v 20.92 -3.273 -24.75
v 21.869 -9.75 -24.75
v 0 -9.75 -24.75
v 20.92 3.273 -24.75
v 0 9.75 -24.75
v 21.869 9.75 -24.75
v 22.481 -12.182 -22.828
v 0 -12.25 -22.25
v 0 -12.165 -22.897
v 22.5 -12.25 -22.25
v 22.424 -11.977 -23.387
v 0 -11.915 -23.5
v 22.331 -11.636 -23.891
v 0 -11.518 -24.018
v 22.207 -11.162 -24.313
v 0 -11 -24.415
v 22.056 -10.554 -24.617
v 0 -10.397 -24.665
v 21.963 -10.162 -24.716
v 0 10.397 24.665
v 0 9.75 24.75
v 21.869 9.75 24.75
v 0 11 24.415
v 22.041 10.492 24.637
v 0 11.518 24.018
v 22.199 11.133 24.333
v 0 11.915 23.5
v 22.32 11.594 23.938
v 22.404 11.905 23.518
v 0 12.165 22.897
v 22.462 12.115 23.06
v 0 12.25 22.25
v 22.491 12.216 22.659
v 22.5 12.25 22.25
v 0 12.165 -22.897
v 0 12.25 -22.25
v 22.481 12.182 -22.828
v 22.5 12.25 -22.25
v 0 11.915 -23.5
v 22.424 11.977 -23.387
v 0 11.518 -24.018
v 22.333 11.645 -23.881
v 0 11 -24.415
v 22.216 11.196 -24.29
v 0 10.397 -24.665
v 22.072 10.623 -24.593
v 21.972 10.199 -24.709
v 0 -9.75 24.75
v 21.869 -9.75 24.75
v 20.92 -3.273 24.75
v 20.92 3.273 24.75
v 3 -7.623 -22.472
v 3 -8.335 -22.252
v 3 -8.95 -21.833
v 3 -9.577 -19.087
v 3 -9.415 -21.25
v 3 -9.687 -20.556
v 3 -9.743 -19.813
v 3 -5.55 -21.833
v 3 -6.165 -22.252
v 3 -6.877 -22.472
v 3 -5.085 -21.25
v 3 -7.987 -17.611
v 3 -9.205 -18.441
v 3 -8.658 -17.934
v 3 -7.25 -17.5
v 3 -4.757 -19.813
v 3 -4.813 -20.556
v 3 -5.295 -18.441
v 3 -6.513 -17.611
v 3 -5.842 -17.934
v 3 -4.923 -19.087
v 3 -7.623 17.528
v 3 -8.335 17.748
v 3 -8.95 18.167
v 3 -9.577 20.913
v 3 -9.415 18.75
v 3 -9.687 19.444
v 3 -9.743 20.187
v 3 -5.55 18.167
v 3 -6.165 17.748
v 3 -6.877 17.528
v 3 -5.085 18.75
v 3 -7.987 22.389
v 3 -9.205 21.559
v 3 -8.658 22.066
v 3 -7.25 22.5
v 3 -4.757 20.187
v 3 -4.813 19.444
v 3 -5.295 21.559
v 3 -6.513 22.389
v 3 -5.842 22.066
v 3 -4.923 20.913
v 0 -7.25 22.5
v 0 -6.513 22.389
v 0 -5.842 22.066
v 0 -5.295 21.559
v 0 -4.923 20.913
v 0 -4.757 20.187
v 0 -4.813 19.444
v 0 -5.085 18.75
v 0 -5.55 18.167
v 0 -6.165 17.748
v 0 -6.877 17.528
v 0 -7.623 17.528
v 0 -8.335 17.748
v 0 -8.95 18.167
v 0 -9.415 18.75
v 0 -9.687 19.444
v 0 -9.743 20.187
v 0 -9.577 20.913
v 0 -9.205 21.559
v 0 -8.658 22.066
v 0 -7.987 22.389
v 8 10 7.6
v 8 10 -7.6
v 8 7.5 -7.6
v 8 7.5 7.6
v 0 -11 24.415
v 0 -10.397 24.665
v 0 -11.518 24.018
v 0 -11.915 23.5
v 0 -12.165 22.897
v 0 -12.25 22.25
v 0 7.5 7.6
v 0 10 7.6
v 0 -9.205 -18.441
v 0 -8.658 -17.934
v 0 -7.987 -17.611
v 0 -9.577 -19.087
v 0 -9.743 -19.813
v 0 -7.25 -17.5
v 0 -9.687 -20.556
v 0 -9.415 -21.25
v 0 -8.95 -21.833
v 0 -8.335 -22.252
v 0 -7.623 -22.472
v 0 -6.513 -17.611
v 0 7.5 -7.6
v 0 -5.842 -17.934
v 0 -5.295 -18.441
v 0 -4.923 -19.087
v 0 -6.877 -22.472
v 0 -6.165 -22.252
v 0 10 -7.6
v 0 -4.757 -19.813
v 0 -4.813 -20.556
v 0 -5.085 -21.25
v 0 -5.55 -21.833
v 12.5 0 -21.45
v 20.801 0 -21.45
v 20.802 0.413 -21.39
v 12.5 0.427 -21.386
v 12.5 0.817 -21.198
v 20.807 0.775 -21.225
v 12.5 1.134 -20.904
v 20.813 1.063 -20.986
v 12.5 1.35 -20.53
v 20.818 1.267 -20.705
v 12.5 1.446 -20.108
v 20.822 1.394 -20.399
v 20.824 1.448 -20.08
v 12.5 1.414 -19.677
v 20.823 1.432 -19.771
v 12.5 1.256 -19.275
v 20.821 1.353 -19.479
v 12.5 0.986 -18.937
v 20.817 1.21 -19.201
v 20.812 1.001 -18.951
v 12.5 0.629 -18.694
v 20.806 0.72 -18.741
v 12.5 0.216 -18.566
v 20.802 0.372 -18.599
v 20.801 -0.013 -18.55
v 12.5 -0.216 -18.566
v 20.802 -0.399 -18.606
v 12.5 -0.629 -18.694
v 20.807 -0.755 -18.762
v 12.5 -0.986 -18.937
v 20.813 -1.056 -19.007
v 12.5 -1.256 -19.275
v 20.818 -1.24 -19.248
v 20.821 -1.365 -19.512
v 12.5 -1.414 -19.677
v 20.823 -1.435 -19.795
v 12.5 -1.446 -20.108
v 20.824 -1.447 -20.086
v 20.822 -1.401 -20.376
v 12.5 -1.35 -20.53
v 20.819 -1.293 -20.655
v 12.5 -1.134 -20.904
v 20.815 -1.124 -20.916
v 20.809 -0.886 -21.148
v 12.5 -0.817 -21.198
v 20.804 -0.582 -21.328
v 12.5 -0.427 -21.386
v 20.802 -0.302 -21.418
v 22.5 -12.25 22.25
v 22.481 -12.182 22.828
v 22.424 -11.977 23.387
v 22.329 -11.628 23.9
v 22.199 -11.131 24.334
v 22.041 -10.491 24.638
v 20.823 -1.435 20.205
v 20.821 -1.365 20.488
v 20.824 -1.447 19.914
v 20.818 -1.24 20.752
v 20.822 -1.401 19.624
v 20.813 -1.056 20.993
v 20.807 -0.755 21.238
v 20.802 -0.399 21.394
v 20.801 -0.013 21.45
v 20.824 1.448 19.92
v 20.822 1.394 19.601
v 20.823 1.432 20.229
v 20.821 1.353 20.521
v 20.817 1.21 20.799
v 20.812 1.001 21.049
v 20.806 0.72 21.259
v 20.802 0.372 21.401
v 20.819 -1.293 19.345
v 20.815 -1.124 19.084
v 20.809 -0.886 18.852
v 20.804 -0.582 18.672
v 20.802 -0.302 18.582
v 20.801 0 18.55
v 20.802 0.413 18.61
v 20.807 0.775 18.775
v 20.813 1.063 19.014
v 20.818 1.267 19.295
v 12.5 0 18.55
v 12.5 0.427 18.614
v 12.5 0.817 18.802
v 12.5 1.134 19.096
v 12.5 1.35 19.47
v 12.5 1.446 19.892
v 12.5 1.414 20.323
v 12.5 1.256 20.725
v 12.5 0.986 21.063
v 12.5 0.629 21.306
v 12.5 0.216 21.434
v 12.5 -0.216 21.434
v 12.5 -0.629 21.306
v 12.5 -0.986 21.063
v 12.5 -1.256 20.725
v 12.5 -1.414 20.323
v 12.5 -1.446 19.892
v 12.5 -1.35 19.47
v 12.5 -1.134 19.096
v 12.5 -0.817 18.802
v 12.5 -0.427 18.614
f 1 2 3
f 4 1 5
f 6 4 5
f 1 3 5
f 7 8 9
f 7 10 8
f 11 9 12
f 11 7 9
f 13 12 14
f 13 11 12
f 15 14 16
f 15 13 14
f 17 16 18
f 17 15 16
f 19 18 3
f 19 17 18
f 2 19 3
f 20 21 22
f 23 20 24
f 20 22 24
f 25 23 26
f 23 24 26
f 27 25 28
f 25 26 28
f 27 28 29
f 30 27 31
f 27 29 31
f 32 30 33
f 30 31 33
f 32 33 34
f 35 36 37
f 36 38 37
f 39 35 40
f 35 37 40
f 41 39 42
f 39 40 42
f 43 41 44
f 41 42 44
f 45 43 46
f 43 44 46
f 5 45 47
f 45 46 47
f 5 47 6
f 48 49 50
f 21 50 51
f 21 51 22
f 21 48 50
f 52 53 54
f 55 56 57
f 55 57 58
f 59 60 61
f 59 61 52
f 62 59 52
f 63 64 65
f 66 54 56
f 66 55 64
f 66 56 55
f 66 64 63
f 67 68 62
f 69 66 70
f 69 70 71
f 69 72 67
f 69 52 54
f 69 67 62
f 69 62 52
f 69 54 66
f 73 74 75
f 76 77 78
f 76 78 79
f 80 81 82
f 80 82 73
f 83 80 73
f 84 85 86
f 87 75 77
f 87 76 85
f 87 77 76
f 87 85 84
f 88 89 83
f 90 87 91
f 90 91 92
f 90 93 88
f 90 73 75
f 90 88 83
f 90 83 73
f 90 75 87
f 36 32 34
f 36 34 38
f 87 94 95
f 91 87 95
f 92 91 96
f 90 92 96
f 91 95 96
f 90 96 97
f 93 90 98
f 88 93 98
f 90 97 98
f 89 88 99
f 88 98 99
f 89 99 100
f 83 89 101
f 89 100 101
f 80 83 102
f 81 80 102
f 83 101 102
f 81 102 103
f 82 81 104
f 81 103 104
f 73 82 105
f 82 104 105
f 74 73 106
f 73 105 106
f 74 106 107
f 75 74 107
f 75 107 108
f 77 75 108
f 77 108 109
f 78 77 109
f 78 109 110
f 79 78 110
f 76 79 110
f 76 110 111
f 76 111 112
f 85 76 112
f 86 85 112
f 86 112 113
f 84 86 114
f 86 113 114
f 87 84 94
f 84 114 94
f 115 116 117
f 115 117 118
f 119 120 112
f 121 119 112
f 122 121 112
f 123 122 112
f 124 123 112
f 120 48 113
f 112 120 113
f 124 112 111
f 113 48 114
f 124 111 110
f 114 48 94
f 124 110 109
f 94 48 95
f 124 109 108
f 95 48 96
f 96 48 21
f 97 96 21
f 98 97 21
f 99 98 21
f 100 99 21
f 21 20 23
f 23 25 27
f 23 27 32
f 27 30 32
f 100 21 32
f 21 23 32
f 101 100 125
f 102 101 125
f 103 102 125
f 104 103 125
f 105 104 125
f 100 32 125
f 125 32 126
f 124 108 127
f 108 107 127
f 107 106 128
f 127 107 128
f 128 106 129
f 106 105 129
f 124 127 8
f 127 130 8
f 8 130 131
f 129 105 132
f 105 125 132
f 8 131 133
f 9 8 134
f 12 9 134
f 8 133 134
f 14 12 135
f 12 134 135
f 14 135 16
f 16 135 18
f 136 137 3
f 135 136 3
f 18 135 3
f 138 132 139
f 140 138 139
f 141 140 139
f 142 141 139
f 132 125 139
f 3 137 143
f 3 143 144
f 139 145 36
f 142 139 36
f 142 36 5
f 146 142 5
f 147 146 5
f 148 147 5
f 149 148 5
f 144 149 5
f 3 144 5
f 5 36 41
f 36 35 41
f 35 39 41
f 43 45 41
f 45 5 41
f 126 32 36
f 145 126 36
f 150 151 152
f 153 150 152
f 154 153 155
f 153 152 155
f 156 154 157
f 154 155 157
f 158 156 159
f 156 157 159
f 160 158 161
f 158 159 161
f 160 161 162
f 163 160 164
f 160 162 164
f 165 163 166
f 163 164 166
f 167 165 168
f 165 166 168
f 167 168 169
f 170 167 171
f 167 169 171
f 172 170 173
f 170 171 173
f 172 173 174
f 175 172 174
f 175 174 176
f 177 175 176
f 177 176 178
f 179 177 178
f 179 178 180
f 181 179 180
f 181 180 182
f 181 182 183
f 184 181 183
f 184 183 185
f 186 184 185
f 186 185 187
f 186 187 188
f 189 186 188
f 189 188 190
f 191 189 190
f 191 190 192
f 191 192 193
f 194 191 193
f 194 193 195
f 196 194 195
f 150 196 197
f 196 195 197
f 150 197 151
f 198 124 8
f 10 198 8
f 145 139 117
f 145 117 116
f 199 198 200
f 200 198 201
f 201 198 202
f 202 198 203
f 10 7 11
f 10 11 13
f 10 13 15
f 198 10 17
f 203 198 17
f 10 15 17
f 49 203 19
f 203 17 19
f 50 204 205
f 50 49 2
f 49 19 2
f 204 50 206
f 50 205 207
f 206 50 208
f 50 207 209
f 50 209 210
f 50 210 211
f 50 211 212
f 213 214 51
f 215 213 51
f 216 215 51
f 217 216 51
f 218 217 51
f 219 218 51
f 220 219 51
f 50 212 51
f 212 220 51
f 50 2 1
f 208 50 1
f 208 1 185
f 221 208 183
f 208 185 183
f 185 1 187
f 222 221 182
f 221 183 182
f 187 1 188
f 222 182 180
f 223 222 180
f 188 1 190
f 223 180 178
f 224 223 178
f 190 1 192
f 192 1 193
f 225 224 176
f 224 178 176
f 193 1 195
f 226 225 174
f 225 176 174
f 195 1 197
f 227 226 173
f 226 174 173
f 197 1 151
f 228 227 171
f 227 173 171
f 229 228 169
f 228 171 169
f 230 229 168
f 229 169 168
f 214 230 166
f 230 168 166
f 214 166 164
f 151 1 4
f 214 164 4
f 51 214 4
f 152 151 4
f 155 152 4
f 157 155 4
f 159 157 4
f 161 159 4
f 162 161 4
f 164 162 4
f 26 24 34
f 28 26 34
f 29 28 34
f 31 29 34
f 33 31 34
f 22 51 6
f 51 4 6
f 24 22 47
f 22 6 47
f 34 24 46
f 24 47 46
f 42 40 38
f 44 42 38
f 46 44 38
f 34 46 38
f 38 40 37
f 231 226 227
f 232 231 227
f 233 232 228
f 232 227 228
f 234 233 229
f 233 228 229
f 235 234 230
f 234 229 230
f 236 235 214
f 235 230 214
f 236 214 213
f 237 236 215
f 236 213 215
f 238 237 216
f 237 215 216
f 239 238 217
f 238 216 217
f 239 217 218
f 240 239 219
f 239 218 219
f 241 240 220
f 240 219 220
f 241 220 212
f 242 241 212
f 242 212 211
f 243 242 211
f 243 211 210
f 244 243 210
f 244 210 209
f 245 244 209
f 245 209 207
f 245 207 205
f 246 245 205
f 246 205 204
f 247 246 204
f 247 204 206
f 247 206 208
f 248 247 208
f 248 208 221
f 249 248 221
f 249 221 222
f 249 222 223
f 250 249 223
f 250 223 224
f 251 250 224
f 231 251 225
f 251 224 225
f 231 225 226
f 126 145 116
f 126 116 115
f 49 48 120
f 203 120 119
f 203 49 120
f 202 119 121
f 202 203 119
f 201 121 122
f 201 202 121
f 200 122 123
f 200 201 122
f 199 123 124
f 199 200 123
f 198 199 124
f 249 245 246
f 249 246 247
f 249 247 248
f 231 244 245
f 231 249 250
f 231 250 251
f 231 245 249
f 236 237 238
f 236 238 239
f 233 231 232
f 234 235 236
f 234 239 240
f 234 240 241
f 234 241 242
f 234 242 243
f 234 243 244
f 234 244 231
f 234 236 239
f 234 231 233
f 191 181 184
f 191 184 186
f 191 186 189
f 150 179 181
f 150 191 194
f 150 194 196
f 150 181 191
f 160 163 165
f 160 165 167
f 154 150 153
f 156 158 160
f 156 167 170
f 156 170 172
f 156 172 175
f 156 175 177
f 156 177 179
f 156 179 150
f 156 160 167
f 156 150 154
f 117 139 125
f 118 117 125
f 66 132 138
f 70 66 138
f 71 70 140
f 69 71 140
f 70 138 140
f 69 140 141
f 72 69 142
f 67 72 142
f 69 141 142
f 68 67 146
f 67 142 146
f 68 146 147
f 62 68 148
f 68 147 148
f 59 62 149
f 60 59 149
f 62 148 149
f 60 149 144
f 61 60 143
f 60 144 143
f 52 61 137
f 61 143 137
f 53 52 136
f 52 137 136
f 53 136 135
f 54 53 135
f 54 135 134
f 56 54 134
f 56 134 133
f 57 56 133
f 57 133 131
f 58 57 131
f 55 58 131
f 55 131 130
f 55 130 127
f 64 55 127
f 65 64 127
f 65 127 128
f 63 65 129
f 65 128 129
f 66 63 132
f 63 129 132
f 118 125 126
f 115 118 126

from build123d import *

# Parameters (mm, degrees)
SKETCH_1_W          = 49.5
SKETCH_1_H          = 24.5
EXTRUDE_1_DEPTH     = 22.5
SKETCH_2_R          = 2.5
CUT_EXTRUDE_1_DEPTH = 3
SKETCH_3_W          = 15.2
SKETCH_3_H          = 2.5
CUT_EXTRUDE_2_DEPTH = 8
CUT_EXTRUDE_3_DEPTH = 50
CUT_EXTRUDE_START   = 22.5
SKETCH_5_R          = 1.45
CUT_EXTRUDE_4_DEPTH = 10
FILLET_1_R          = 2.5


with BuildPart() as part:
    # Эскиз1 → Бобышка-Вытянуть1 (new body)
    with BuildSketch(Plane(origin=(0, 0, 0), x_dir=(0, 0, -1), z_dir=(1, 0, 0))):
        Rectangle(SKETCH_1_W, SKETCH_1_H)
    extrude(amount=EXTRUDE_1_DEPTH)

    # Эскиз2 → Вырез-Вытянуть1 (cut)
    with BuildSketch(Plane.ZY):
        with Locations((-20, -7.25)):
            Circle(SKETCH_2_R)
        with Locations((20, -7.25)):
            Circle(SKETCH_2_R)
    extrude(amount=-CUT_EXTRUDE_1_DEPTH, mode=Mode.SUBTRACT)

    # Эскиз3 → Вырез-Вытянуть2 (cut)
    with BuildSketch(Plane.ZY):
        with Locations((0, 8.75)):
            Rectangle(SKETCH_3_W, SKETCH_3_H)
    extrude(amount=-CUT_EXTRUDE_2_DEPTH, mode=Mode.SUBTRACT)

    # Эскиз4 → Вырез-Вытянуть3 (cut)
    with BuildSketch(Plane(origin=(0, 0, -24.75), x_dir=(-1, 0, 0), z_dir=(0, 0, -1))):
        with BuildLine():
            Line((-22.5, 12.25), (-22.5, -12.25))
            ThreePointArc((-22.5, -12.25), (-20.800548495, 0), (-22.5, 12.25))
        make_face()
    extrude(amount=-CUT_EXTRUDE_3_DEPTH, mode=Mode.SUBTRACT)

    # Эскиз5 → Вырез-Вытянуть4 (cut)
    with BuildSketch(Plane(origin=(0, 0, 0), x_dir=(0, 0, -1), z_dir=(1, 0, 0)).offset(CUT_EXTRUDE_START)):
        with Locations((-20, 0)):
            Circle(SKETCH_5_R)
        with Locations((20, 0)):
            Circle(SKETCH_5_R)
    extrude(amount=-CUT_EXTRUDE_4_DEPTH, mode=Mode.SUBTRACT)

    # Скругление1
    fillet_1_edges = [part.edges().sort_by_distance(p)[0] for p in [
        (11.25, 12.25, -24.75),
        (11.25, -12.25, -24.75),
        (11.25, -12.25, 24.75),
        (11.25, 12.25, 24.75),
    ]]
    fillet(fillet_1_edges, radius=FILLET_1_R)


solid = part.part
